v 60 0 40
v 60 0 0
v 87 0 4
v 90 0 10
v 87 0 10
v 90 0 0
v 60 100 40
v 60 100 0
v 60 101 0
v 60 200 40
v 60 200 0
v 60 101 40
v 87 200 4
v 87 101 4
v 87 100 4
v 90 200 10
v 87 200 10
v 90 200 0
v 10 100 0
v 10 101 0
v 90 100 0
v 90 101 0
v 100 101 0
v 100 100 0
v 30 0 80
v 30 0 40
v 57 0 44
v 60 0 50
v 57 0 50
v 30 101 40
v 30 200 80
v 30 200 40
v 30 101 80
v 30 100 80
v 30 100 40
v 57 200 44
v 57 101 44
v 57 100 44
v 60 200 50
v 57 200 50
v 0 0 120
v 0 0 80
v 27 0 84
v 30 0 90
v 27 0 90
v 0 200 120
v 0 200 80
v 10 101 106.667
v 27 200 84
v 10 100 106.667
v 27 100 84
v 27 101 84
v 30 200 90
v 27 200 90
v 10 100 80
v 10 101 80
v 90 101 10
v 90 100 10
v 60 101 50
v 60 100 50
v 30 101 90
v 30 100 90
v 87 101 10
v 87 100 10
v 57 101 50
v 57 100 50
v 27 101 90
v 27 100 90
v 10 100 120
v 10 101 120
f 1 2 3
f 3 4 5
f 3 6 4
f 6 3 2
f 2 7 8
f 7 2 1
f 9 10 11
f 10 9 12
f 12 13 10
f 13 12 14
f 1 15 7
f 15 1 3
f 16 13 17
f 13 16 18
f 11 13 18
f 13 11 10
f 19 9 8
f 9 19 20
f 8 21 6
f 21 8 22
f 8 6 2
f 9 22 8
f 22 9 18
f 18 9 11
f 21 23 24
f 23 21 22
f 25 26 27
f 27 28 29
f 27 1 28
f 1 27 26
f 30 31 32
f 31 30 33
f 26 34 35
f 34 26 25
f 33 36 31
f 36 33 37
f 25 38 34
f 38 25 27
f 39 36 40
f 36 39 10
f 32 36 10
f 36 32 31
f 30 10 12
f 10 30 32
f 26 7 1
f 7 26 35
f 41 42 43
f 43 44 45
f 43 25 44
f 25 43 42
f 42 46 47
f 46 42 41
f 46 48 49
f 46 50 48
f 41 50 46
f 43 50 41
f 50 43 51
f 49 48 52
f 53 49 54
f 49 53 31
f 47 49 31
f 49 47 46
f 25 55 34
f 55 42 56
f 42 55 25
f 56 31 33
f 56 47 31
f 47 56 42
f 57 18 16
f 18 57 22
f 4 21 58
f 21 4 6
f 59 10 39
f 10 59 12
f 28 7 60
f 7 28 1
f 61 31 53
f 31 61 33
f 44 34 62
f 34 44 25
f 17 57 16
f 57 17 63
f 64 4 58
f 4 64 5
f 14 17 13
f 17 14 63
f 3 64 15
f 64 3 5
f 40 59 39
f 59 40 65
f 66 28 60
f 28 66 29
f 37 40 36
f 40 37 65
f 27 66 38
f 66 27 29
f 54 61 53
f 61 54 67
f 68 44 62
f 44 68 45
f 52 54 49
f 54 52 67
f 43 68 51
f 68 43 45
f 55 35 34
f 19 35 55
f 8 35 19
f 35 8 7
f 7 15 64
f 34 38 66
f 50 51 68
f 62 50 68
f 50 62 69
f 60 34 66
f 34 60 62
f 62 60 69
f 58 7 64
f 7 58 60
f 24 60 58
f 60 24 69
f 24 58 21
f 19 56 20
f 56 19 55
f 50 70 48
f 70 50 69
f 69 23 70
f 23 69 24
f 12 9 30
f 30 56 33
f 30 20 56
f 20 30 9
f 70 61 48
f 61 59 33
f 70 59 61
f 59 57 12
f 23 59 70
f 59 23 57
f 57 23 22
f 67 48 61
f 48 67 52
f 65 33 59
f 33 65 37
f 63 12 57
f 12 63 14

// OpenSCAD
/**
Configuration variables
**/
materialThicknessMM = 3;

noOfShelves = 3;
shelfDepthMM = 30;
shelfHeightMM = 40;
shelfWidthMM = 200;
shelfLipHeightMM = 10;

shelfSidePaddingMM = 6;
shelfBackPaddingMM = 30;
shelfFrontPaddingMM = 6;

colorAlpha = 1;

debug = true;
debugColor = [111/255, 30/255, 81/255, 0.4];

module shelfMarker() {
    triangleDepth = shelfDepthMM;
    triangleHeight = shelfHeightMM;
    triangleWidth = shelfWidthMM;
    
    color(debugColor) createTriangle(triangleDepth, triangleWidth, triangleHeight);
}

module shelfMarkers() {
    for (i = [1 : noOfShelves]) {
        xOffset = (noOfShelves - i) * shelfDepthMM;
        zOffset = (i - 1) * shelfHeightMM;
        translate([xOffset, 0, zOffset]) {
            shelfMarker();
        }
    }
}

module printDebug() {
    if (debug) {
        shelfMarkers();
    }
}


module createTriangle(triangleDepth, triangleWidth, triangleHeight) {
    polyhedron(
        points = [
            /* Top Left    0 */ [0, 0, triangleHeight],
            /* Front Left  1 */ [triangleDepth, 0, 0], 
            /* Back Left   2 */ [0, 0, 0],
            /* Top Right   3 */ [0, triangleWidth, triangleHeight],
            /* Front Right 4 */ [triangleDepth, triangleWidth, 0],
            /* Back Right  5 */ [0, triangleWidth, 0],
        ],
        faces = [
            /* Left Face   */ [0, 1, 2],
            /* Right Face  */ [5, 4, 3],
            /* Bottom Face */ [2, 1, 4, 5],
            /* Back Face   */ [3, 0, 2, 5],
            /* Front Face  */ [0, 3, 4, 1],
        ]
    );
}

module base() {
    color([18/255, 203/255, 196/255]) cube([shelfDepthMM, shelfWidthMM, materialThicknessMM]);
}

module bases() {
    for (i = [1 : noOfShelves]) {
        xOffset = (noOfShelves - i) * shelfDepthMM;
        zOffset = (i - 1) * shelfHeightMM;
        translate([xOffset, 0, zOffset]) {
            base();
        }
    }
}


module lip() {
    color([6/255, 82/255, 221/255]) cube([materialThicknessMM, shelfWidthMM, shelfLipHeightMM]);
}

module lips() {
    for (i = [1 : noOfShelves]) {
        xOffset = ((noOfShelves - i + 1) * shelfDepthMM) - materialThicknessMM;
        zOffset = (i - 1) * shelfHeightMM;
        translate([xOffset, 0, zOffset]) {
            lip();
        }
    }
}



module sideMarker() {
    translate([10, shelfWidthMM / 2, 0]) {
    createTriangle(shelfDepthMM * noOfShelves, 1, shelfHeightMM * noOfShelves);
    }
}

printDebug();

bases();
lips();
sideMarker();
